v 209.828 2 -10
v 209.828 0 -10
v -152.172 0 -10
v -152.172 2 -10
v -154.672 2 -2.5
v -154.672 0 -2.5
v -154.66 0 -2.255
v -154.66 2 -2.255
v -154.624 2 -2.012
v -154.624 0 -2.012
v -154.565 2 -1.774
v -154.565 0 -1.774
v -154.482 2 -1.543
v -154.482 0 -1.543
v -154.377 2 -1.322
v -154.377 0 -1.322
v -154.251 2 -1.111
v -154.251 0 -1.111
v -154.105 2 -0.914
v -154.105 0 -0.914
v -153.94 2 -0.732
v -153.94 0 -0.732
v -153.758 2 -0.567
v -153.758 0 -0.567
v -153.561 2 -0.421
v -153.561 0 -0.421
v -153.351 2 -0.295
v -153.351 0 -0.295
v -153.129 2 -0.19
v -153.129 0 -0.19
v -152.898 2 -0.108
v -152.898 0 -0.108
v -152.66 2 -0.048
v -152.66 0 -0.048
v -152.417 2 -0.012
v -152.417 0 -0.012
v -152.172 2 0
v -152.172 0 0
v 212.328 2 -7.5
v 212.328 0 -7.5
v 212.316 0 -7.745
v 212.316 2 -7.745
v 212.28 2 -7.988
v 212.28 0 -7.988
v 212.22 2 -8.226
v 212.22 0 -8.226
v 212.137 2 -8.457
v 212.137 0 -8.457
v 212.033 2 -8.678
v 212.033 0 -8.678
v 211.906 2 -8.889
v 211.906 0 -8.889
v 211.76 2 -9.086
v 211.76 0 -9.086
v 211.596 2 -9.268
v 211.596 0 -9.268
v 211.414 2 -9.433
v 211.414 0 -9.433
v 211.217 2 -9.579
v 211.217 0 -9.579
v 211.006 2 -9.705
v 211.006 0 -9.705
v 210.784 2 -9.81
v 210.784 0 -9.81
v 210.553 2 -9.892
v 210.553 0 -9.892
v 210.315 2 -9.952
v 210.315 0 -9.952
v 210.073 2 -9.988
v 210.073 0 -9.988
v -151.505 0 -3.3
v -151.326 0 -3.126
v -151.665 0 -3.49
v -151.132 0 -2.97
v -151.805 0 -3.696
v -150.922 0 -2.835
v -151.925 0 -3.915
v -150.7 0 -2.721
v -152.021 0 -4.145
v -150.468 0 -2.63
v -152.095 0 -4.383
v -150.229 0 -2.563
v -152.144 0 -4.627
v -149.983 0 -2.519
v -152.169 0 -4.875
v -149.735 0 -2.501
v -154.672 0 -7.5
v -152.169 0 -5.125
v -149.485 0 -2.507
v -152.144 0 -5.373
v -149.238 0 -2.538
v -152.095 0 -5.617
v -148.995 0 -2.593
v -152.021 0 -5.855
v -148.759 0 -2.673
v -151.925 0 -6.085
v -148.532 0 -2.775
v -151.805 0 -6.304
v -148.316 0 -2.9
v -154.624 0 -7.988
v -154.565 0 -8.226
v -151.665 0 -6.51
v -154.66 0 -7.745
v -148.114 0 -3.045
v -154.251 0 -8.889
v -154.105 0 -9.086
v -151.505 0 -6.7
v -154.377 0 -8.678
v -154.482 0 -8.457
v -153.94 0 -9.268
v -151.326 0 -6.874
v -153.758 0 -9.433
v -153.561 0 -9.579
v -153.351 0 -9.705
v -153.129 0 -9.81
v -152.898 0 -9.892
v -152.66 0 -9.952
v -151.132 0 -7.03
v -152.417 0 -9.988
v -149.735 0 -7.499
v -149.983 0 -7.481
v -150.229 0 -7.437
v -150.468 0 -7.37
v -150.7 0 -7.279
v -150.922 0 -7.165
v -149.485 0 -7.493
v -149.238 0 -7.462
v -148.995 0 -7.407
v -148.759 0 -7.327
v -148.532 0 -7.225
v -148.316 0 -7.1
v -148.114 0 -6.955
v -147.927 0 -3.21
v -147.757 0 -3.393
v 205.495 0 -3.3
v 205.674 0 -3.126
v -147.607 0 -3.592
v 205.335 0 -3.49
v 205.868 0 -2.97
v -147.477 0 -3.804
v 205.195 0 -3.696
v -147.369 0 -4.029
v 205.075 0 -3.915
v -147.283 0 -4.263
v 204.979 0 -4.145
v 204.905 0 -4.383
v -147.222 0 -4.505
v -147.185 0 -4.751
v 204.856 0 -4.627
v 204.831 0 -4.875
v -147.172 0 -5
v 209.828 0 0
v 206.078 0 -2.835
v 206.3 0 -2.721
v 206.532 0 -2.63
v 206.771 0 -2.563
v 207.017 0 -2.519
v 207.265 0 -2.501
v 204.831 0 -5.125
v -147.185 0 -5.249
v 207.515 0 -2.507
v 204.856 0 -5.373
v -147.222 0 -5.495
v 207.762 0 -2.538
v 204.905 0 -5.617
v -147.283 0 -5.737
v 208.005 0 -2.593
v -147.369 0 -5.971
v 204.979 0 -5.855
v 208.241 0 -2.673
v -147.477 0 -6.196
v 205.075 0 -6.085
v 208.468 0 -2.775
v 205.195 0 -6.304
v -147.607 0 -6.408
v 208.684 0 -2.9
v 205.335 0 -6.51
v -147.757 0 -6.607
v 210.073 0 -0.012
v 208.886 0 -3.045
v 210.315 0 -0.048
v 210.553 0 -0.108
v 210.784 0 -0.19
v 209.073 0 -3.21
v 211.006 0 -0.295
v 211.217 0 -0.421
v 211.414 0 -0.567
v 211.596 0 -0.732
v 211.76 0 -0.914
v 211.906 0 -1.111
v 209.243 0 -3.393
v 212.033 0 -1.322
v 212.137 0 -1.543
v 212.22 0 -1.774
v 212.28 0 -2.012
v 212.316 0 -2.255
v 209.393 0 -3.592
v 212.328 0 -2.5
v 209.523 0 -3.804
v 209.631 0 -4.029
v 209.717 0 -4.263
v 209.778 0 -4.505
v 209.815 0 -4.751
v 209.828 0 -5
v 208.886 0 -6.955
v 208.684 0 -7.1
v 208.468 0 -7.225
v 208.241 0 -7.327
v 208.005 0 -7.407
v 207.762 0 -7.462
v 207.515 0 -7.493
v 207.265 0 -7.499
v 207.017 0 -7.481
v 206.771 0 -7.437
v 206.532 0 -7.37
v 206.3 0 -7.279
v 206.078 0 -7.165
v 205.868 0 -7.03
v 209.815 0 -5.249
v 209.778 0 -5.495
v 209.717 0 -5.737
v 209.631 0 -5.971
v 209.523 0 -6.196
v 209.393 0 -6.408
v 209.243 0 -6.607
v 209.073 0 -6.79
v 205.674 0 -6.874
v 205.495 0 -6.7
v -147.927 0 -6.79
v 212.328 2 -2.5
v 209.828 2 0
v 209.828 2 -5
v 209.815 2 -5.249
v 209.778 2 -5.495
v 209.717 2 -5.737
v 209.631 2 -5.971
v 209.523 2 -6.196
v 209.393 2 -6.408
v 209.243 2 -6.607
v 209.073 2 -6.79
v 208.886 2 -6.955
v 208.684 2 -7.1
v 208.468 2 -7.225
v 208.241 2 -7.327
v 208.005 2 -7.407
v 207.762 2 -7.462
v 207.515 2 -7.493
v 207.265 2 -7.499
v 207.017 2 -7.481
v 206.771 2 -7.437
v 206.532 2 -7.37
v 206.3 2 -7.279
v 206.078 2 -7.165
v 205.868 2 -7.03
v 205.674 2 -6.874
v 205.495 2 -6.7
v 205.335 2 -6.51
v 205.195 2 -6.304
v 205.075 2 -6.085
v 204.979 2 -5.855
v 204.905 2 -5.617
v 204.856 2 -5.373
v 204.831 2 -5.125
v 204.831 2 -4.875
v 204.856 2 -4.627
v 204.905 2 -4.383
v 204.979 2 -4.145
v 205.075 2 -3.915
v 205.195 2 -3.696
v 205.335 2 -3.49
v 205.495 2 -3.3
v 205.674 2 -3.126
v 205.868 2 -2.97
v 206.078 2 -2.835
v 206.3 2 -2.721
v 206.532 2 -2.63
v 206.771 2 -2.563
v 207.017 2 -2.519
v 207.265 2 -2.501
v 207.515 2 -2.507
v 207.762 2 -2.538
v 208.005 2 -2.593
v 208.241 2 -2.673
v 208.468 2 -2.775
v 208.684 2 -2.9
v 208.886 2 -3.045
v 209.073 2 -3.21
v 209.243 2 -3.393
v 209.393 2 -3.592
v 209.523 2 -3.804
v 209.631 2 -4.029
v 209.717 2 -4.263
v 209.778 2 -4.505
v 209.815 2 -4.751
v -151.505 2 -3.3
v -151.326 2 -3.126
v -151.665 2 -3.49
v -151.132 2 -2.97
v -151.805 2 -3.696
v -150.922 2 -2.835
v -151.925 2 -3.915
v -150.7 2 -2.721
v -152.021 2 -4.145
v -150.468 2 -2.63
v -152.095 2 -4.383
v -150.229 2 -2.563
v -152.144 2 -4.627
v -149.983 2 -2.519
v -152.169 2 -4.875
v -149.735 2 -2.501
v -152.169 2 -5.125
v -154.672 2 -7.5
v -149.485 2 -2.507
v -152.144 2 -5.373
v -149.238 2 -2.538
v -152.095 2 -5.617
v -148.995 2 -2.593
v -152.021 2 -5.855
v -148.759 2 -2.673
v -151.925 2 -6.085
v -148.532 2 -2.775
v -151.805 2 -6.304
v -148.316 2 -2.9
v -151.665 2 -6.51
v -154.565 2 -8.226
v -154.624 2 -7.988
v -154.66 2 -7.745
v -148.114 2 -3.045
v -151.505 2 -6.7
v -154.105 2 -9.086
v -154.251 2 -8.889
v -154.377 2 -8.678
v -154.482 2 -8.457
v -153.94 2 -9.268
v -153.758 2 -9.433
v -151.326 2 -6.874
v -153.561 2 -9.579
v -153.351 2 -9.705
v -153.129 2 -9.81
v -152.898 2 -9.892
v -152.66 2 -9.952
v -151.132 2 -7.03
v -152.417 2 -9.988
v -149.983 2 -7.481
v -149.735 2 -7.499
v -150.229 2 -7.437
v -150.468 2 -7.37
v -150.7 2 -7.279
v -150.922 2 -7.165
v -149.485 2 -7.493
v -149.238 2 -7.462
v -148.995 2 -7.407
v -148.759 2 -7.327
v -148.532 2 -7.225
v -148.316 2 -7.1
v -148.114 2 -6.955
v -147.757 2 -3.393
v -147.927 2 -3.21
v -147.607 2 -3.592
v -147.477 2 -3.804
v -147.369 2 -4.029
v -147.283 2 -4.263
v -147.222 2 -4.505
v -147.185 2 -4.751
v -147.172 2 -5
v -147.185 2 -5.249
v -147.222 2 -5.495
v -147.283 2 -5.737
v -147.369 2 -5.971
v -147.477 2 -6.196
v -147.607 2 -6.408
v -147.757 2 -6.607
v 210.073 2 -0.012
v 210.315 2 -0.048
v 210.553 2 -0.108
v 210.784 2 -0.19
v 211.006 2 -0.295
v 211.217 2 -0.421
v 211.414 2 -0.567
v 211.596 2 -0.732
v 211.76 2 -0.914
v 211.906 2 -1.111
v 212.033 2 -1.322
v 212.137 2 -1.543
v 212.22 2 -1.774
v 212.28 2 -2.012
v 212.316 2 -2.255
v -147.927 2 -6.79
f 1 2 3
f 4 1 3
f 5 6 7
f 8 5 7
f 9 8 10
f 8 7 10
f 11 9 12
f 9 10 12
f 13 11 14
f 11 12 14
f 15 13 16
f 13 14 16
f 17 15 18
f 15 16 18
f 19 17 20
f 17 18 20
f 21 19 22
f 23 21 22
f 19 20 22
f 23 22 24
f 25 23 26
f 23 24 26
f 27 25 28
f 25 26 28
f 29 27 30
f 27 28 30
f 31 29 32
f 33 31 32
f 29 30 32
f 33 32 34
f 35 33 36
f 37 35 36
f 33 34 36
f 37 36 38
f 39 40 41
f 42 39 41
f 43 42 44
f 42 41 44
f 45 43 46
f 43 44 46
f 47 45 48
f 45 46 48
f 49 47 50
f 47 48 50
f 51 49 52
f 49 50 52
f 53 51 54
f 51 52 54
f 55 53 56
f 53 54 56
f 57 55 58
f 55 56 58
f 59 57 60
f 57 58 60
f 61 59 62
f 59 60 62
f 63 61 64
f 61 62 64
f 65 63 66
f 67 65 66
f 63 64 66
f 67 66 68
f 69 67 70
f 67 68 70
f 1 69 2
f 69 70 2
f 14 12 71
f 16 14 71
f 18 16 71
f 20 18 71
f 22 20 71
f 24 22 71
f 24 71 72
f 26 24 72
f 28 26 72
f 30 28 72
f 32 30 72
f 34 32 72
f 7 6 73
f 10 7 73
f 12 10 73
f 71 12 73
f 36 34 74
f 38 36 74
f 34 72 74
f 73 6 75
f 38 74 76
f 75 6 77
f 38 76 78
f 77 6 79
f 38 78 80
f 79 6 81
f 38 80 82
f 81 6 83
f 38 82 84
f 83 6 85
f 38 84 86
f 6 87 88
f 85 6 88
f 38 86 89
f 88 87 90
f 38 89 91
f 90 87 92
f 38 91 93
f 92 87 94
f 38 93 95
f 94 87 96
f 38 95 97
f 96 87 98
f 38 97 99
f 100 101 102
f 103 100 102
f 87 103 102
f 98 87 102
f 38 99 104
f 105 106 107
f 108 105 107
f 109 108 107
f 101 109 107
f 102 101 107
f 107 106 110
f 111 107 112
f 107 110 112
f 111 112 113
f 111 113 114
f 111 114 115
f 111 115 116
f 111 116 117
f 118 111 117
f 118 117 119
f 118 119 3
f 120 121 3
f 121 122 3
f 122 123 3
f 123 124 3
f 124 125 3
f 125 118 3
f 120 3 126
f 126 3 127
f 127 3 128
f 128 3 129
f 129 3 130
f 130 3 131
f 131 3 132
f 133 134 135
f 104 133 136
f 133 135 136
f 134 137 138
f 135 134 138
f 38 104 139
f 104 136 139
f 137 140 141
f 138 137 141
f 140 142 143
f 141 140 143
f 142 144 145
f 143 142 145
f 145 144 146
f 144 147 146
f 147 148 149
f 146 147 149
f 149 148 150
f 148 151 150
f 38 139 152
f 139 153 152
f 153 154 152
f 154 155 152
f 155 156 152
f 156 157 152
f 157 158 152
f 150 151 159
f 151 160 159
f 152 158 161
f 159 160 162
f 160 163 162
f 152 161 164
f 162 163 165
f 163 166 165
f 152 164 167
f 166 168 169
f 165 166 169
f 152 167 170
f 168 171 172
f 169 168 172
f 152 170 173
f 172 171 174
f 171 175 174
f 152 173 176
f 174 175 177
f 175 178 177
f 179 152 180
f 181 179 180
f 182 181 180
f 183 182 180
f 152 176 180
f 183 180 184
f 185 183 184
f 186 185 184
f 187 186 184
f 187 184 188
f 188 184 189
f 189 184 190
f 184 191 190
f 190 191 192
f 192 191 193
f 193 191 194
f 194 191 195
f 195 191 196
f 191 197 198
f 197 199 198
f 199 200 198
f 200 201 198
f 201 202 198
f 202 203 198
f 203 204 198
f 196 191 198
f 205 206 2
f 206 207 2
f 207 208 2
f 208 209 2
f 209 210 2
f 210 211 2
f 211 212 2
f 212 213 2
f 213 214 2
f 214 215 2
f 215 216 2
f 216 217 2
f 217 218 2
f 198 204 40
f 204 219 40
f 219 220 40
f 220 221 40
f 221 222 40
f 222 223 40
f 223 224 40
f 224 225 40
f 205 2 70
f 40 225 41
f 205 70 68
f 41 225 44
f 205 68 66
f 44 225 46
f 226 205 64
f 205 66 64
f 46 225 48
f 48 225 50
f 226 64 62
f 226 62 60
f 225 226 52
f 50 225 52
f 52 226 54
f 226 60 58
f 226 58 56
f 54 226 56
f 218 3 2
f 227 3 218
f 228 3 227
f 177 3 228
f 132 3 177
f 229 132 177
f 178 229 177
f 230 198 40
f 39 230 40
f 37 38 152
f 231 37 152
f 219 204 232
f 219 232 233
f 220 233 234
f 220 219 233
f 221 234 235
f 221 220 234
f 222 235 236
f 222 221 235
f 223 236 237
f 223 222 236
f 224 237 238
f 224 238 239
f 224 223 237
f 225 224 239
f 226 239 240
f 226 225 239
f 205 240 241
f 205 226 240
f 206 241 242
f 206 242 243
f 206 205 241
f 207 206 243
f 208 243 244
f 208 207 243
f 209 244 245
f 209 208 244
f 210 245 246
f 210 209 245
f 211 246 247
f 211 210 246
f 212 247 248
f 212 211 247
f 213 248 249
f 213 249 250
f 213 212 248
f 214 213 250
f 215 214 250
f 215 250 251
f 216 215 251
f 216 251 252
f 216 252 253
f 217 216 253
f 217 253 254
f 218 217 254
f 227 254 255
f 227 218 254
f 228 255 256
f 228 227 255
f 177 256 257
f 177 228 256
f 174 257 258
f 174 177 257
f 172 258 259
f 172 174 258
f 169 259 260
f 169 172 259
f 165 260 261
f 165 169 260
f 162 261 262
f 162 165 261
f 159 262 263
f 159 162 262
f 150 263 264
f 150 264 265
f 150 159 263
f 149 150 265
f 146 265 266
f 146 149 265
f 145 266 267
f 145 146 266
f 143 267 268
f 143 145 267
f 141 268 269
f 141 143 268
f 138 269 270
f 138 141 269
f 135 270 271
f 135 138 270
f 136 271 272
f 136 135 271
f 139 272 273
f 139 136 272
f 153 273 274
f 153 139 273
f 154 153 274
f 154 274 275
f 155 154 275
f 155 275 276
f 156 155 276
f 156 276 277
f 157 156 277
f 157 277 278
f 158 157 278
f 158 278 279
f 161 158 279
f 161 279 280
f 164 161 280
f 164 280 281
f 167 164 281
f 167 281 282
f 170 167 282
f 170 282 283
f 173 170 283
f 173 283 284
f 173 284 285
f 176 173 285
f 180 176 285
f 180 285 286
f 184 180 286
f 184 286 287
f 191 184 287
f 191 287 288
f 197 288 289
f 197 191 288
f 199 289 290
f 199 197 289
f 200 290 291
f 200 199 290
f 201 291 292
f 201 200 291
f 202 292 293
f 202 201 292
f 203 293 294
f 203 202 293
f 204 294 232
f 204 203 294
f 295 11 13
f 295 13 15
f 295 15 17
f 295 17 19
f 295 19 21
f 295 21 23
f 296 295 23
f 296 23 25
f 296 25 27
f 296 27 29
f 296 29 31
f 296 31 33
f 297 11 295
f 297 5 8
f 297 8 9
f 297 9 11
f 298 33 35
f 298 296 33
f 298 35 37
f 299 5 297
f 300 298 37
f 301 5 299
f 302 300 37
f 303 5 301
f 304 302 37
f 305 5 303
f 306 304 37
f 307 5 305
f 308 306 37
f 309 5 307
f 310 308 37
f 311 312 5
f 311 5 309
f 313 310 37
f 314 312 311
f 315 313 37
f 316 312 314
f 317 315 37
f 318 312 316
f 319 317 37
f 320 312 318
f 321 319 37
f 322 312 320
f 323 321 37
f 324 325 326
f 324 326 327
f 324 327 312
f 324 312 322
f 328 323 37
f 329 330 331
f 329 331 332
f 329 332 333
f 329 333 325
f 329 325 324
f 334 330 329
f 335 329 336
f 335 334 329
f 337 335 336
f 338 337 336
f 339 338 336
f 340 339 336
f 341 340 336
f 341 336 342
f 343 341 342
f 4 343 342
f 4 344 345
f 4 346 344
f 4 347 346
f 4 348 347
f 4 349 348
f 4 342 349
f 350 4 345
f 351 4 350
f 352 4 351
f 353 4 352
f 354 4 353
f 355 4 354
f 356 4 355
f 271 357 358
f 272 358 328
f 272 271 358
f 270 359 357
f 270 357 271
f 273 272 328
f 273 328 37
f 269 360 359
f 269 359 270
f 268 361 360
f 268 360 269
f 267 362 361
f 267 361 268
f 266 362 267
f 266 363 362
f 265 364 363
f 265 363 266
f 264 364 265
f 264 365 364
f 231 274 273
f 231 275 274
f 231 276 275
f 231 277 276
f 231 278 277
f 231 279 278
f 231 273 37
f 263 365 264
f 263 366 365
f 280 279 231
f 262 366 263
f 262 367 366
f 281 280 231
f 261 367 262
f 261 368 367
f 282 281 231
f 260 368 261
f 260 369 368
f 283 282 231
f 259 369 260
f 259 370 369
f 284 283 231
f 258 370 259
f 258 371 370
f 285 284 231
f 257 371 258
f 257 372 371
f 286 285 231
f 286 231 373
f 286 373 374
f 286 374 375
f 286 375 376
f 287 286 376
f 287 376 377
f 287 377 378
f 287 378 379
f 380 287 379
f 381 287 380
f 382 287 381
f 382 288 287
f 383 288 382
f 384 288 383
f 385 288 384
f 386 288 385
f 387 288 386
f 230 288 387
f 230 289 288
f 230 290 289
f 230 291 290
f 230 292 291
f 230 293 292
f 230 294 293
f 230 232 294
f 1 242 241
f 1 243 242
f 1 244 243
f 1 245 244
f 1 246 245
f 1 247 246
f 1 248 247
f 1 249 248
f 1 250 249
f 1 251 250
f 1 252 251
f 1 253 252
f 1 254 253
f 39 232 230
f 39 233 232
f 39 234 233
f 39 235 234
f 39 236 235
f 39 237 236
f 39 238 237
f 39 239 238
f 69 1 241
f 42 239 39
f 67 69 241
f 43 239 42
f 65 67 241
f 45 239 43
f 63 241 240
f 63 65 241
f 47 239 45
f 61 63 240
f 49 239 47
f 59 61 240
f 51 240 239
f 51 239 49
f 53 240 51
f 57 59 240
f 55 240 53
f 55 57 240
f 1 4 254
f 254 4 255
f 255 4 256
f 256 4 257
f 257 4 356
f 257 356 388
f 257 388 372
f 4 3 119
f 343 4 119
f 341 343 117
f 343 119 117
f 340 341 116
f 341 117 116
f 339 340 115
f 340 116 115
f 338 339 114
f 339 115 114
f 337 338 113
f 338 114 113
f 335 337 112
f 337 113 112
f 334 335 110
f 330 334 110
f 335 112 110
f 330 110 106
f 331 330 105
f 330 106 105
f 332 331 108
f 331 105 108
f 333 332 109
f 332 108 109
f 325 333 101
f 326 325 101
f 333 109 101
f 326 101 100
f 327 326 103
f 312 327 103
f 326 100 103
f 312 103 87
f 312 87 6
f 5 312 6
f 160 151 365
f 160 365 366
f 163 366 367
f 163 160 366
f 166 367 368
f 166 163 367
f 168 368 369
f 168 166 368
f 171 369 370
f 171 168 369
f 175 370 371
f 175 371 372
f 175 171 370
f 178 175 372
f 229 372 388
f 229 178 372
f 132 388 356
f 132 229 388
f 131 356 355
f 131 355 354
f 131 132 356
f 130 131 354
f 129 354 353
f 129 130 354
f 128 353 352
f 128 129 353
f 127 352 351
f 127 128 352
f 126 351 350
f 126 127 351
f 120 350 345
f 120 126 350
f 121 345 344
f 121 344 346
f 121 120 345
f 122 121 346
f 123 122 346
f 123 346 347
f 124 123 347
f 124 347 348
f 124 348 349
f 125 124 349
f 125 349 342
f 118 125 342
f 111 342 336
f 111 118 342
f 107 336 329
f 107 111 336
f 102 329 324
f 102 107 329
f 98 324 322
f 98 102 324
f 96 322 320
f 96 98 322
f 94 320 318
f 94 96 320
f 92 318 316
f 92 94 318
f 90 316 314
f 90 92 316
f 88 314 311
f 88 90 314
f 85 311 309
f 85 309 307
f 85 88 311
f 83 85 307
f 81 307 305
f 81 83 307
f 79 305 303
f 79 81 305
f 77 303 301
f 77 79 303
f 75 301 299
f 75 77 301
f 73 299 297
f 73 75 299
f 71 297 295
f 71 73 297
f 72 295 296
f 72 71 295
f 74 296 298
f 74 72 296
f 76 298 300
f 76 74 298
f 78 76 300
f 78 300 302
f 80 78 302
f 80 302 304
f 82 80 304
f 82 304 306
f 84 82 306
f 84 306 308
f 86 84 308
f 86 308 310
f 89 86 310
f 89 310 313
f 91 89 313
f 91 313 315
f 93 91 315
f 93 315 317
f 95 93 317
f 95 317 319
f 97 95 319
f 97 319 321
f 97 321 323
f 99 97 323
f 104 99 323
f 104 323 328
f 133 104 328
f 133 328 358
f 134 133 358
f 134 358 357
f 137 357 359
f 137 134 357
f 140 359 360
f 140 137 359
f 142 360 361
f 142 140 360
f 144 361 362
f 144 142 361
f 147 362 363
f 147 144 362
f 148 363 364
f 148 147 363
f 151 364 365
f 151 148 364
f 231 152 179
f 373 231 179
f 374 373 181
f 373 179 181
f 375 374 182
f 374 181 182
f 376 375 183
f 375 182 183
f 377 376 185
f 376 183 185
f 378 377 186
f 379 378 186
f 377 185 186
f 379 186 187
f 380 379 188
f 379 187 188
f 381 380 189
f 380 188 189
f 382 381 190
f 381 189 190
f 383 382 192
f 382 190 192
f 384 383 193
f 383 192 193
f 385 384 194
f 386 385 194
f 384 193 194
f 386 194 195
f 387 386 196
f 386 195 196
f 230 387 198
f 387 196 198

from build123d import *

# Parameters (mm, degrees)
SKETCH1_R           = 2.5
BOSS_EXTRUDE2_DEPTH = 2
FLEX1_OUTLINE_R     = 2.5
FLEX1_DEPTH         = 2


# Read off the part's stored shape, not the designer's step: Flex1
with BuildPart() as part:
    # Sketch1 → Boss-Extrude2 (new body)
    with BuildSketch(Plane(origin=(0, 0, 0), x_dir=(1, 0, 0), z_dir=(0, 1, 0))):
        with BuildLine():
            Line((2.5, 0), (47.5, 0))
            ThreePointArc((47.5, 0), (49.267766953, 0.732233047), (50, 2.5))
            Line((50, 2.5), (50, 7.5))
            ThreePointArc((50, 7.5), (49.267766953, 9.267766953), (47.5, 10))
            Line((47.5, 10), (2.5, 10))
            ThreePointArc((2.5, 10), (0.732233047, 9.267766953), (0, 7.5))
            Line((0, 7.5), (0, 2.5))
            ThreePointArc((0, 2.5), (0.732233047, 0.732233047), (2.5, 0))
        make_face()
        with Locations(Location((5, 5, 0), (0, 0, 270))):
            Circle(SKETCH1_R, mode=Mode.SUBTRACT)
        with Locations(Location((45, 5, 0), (0, 0, 270))):
            Circle(SKETCH1_R, mode=Mode.SUBTRACT)
    extrude(amount=BOSS_EXTRUDE2_DEPTH)

    # Flex1 outline → Flex1 (add)
    # profile 1 of 4: a face of its own
    with BuildSketch(Plane(origin=(0, 0, 0), x_dir=(1, 0, 0), z_dir=(0, 1, 0))):
        with BuildLine():
            Line((2.5, 10), (-152.172258813, 10))
            ThreePointArc((-152.172258813, 10), (-153.940025766, 9.267766953), (-154.672258813, 7.5))
            Line((-154.672258813, 7.5), (-154.672258813, 2.5))
            ThreePointArc((-154.672258813, 2.5), (-153.940025766, 0.732233047), (-152.172258813, 0))
            Line((-152.172258813, 0), (2.5, 0))
            ThreePointArc((2.5, 0), (0.732233047, 0.732233047), (0, 2.5))
            Line((0, 2.5), (0, 7.5))
            ThreePointArc((0, 7.5), (0.732233047, 9.267766953), (2.5, 10))
        make_face()
        with Locations((-149.672258813, 5)):
            Circle(FLEX1_OUTLINE_R, mode=Mode.SUBTRACT)
    # profile 2 of 4: a face of its own
    with BuildSketch(Plane(origin=(0, 0, 0), x_dir=(1, 0, 0), z_dir=(0, 1, 0))):
        with BuildLine():
            Line((209.827741187, 10), (47.5, 10))
            ThreePointArc((47.5, 10), (49.267766953, 9.267766953), (50, 7.5))
            Line((50, 7.5), (50, 2.5))
            ThreePointArc((50, 2.5), (49.267766953, 0.732233047), (47.5, 0))
            Line((47.5, 0), (209.827741187, 0))
            ThreePointArc((209.827741187, 0), (211.59550814, 0.732233047), (212.327741187, 2.5))
            Line((212.327741187, 2.5), (212.327741187, 7.5))
            ThreePointArc((212.327741187, 7.5), (211.59550814, 9.267766953), (209.827741187, 10))
        make_face()
        with Locations((207.327741187, 5)):
            Circle(FLEX1_OUTLINE_R, mode=Mode.SUBTRACT)
    # profile 3 of 4: a face of its own
    with BuildSketch(Plane(origin=(0, 0, 0), x_dir=(1, 0, 0), z_dir=(0, 1, 0))):
        with Locations((5, 5)):
            Circle(FLEX1_OUTLINE_R)
    # profile 4 of 4: a face of its own
    with BuildSketch(Plane(origin=(0, 0, 0), x_dir=(1, 0, 0), z_dir=(0, 1, 0))):
        with Locations((45, 5)):
            Circle(FLEX1_OUTLINE_R)
    extrude(amount=FLEX1_DEPTH)


solid = part.part
